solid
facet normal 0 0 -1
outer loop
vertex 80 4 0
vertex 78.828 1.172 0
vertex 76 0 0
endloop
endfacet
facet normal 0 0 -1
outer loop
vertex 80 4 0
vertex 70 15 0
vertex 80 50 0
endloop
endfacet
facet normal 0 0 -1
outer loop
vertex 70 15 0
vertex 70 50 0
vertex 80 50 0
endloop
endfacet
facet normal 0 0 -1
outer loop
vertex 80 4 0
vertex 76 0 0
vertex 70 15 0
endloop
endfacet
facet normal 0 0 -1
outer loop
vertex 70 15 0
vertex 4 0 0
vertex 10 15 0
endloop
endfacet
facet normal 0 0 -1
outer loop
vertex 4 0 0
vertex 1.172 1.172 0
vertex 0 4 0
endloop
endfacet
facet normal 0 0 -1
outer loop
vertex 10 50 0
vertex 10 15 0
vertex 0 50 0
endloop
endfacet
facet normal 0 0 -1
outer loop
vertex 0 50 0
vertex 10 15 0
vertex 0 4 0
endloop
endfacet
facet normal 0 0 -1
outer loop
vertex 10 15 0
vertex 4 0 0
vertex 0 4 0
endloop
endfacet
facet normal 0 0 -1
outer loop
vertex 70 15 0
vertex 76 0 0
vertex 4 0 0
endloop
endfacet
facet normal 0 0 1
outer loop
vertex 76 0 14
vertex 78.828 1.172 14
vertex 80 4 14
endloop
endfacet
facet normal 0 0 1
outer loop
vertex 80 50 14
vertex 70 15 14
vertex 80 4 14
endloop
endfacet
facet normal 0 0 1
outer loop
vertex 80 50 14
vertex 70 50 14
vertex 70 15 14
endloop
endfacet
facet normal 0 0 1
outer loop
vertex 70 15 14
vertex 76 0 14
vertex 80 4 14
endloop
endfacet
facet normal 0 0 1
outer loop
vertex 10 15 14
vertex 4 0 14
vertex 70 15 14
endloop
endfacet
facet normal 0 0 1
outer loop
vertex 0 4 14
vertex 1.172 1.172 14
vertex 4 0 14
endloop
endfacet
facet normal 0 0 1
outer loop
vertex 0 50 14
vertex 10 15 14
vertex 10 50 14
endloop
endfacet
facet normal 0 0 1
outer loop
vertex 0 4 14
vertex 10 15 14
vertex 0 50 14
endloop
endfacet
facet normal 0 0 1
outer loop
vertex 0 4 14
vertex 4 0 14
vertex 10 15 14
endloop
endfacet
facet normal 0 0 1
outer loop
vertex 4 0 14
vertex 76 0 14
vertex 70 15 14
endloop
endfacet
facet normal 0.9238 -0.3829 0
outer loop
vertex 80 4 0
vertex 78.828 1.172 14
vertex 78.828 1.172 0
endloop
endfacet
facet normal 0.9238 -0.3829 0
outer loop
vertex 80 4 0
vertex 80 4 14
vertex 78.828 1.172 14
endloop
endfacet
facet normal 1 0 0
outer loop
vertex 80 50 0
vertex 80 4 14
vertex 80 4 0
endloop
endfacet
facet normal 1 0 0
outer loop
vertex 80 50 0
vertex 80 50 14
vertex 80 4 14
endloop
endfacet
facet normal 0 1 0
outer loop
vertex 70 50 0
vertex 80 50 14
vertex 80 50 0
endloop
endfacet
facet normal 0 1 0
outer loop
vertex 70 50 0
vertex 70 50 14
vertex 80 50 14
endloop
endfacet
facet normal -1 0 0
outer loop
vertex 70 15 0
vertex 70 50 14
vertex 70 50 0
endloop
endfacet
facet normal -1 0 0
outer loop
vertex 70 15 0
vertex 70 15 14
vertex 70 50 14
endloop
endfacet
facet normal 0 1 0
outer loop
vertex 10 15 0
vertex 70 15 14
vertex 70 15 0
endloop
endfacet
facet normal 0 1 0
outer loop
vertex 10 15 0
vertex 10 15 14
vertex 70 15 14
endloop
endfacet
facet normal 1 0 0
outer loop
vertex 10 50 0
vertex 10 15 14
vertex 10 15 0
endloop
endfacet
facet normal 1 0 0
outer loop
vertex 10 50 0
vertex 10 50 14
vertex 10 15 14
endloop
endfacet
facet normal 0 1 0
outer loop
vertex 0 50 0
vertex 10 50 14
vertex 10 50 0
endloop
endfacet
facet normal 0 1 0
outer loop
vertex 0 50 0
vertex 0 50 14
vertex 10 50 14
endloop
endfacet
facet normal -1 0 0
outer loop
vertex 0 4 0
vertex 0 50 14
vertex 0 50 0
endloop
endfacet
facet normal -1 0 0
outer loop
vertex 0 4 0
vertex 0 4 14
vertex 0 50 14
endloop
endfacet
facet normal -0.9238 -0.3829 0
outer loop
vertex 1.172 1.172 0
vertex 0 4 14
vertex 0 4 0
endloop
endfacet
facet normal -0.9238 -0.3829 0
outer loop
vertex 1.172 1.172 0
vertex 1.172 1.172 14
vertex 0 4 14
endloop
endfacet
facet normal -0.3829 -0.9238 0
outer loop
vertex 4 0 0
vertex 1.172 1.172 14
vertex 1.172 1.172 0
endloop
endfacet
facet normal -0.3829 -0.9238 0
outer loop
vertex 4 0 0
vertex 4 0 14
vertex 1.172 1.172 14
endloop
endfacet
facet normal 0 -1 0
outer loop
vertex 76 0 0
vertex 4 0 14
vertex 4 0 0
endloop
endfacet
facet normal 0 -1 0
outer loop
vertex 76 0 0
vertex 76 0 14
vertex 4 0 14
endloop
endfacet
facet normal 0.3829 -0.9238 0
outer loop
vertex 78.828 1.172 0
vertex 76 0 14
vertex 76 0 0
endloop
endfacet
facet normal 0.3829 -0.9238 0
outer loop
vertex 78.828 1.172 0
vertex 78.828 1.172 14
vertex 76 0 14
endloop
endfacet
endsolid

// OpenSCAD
$fn = 32;

// ----------------------------------------------------------------------
// Heat sink frame: 80 x 50 mm frame, 10 mm walls
// ----------------------------------------------------------------------

// --- parameters (mm) ---
profile_height = 14;      // extrusion height
profile_points = 12;      // points of the closed outline

profile = [[0, 4], [1.172, 1.172], [4, 0], [76, 0], [78.828, 1.172], [80, 4], [80, 50], [70, 50], [70, 15], [10, 15], [10, 50], [0, 50]];  // single closed polygon, 12 points, counter clockwise

// --- the one profile operation ---
linear_extrude(height = profile_height) polygon(points = profile);
